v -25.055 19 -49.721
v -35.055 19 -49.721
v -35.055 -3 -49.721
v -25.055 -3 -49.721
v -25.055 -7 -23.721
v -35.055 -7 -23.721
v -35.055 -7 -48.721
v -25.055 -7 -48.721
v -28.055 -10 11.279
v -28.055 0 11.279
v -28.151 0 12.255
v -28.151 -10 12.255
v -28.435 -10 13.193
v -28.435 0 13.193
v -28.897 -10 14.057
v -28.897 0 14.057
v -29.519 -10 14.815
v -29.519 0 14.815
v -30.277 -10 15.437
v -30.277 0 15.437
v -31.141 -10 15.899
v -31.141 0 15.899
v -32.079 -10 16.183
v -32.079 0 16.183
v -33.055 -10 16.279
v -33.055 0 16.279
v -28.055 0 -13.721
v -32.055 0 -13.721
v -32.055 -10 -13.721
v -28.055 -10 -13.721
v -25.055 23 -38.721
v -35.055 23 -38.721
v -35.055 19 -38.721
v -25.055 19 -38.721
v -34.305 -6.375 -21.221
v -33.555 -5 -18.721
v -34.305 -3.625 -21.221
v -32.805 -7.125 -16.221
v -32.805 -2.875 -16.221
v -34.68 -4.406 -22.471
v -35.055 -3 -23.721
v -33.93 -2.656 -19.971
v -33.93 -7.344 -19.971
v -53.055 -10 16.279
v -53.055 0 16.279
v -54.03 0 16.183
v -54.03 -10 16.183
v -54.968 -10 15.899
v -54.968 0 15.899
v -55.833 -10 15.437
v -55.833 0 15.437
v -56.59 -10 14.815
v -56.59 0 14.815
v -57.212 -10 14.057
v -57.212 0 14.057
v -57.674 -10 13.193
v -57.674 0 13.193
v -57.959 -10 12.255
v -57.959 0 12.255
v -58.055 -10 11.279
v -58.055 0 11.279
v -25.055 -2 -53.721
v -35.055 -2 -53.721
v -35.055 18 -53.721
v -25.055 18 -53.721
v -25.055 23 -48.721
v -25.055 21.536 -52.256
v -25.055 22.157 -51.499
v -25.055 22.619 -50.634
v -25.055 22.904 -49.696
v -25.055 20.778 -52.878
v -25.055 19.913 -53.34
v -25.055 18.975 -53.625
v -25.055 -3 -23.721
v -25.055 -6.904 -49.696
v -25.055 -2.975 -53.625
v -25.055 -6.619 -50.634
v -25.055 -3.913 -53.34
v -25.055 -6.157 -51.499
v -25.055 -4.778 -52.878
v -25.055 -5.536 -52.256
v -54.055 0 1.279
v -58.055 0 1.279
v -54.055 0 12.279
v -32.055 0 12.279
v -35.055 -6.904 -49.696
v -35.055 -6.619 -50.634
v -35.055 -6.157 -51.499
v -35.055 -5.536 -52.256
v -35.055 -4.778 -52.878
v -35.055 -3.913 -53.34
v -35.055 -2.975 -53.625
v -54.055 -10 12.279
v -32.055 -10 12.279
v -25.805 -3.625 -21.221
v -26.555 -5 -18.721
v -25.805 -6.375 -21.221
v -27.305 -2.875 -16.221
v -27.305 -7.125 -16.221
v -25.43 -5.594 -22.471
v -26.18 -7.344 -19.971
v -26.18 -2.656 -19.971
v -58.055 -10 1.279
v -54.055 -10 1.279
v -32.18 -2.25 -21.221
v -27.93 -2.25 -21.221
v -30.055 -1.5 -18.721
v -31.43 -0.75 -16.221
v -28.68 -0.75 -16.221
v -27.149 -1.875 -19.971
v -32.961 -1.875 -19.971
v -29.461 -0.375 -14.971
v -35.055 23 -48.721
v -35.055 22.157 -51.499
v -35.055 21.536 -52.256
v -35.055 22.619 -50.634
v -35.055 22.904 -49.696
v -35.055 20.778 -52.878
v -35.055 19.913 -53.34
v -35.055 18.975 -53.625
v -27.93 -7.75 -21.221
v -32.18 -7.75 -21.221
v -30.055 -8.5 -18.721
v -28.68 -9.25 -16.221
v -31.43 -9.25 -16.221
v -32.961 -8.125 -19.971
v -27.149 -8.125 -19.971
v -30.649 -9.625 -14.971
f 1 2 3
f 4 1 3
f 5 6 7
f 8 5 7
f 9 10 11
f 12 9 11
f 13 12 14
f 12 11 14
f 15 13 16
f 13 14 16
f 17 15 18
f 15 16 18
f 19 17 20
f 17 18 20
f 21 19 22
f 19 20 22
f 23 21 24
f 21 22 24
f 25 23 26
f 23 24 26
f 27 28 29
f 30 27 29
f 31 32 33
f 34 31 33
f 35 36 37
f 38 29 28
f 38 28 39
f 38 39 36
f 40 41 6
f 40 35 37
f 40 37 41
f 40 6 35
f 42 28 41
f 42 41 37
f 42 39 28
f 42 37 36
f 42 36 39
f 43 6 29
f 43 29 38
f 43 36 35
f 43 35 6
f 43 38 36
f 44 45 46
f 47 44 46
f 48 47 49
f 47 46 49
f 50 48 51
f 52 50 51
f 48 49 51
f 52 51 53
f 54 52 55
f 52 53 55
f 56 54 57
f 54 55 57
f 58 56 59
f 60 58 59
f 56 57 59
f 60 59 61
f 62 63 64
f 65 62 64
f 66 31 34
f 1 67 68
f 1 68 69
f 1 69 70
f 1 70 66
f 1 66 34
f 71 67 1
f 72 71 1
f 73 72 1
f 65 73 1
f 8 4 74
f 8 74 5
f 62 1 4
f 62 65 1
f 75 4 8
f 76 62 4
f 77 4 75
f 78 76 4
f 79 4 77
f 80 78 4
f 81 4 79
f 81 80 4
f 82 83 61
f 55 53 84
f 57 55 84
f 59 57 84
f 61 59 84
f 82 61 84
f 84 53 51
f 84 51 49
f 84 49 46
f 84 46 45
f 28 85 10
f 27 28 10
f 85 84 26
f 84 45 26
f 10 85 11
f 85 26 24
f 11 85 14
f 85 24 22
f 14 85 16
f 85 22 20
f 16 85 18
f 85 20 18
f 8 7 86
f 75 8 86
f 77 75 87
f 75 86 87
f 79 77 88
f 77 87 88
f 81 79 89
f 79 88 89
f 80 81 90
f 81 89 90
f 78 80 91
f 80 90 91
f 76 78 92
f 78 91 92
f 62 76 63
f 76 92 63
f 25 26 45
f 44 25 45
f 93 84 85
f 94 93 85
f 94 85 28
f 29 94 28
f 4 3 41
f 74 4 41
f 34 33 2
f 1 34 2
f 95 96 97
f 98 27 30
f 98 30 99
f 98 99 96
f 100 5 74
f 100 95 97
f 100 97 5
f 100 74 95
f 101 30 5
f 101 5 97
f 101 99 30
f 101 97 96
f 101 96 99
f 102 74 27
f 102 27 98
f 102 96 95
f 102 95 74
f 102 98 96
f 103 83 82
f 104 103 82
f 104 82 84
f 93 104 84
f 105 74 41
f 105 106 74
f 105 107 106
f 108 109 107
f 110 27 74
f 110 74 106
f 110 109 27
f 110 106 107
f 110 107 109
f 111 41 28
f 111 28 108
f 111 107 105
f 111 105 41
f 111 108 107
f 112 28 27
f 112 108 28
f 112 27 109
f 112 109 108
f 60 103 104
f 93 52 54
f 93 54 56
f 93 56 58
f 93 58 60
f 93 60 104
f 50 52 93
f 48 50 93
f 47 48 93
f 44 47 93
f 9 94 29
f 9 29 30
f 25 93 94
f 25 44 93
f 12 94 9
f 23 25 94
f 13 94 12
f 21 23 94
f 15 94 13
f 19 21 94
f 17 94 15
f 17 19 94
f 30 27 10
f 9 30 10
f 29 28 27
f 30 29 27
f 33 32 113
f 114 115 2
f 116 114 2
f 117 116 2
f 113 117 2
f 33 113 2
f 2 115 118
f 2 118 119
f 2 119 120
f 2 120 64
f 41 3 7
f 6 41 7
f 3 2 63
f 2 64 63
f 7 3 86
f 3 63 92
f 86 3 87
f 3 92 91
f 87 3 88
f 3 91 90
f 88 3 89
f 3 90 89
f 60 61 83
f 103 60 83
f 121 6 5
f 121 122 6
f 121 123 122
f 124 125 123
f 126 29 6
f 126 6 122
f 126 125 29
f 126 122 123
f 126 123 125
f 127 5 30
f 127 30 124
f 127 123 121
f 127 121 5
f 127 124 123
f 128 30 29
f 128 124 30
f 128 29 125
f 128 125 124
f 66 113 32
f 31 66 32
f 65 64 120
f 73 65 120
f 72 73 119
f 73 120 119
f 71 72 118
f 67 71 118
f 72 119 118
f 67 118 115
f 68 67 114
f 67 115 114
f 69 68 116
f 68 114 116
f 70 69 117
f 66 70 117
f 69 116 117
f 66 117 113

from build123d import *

# Parameters (mm, degrees)
F1_DEPTH  = 10
F2_ANGLE  = 180
F3_ANGLE  = 90
F2_FACE_W = 10
F2_FACE_H = 4
F1_FACE_W = 4
F1_FACE_H = 10


with BuildPart() as f1:
    # F0 (on Front) → F1 (new body)
    with BuildSketch(Plane.XZ):
        with BuildLine():
            Line((-33.0547787249, 16.2792187184), (-53.0547787249, 16.2792187184))
            ThreePointArc((-53.0547787249, 16.2792187184), (-56.5903126308, 14.8147526243), (-58.0547787249, 11.2792187184))
            Line((-58.0547787249, 11.2792187184), (-58.0547787249, 1.2792187184))
            Line((-58.0547787249, 1.2792187184), (-54.0547787249, 1.2792187184))
            Line((-54.0547787249, 1.2792187184), (-54.0547787249, 12.2792187184))
            Line((-54.0547787249, 12.2792187184), (-32.0547787249, 12.2792187184))
            Line((-32.0547787249, 12.2792187184), (-32.0547787249, -13.7207812816))
            Line((-32.0547787249, -13.7207812816), (-28.0547787249, -13.7207812816))
            Line((-28.0547787249, -13.7207812816), (-28.0547787249, 11.2792187184))
            ThreePointArc((-28.0547787249, 11.2792187184), (-29.519244819, 14.8147526243), (-33.0547787249, 16.2792187184))
        make_face()
    extrude(amount=F1_DEPTH)


with BuildPart() as f2_1:
    # F2: copy of F1
    add(f1.part.rotate(Axis((-28.0547787249, -5, -13.7207812816), (0, 1, 0)), F2_ANGLE))


with BuildPart() as f2_1_1:
    # F3: moved
    add(f2_1.part.rotate(Axis((-28.0547787249, 0, -26.2207812816), (0, 0, 1)), F3_ANGLE))


with BuildPart() as f2_1_2:
    # F4: moved
    add(f2_1_1.part.moved(Location((-7, -7, -10))))

    # F2_face (on face) → F5 section 0
    with BuildSketch(Plane(origin=(-30.0547787249, -5, -23.7207812816), x_dir=(1, 0, 0), z_dir=(0, 0, 1))):
        Rectangle(F2_FACE_W, F2_FACE_H)
    # F1_face (on face) → F5 section 1
    with BuildSketch(Plane(origin=(-30.0547787249, -5, -13.7207812816), x_dir=(1, 0, 0), z_dir=(0, 0, -1))):
        Rectangle(F1_FACE_W, F1_FACE_H)
    loft()


solid = Compound([f1.part, f2_1_2.part])
